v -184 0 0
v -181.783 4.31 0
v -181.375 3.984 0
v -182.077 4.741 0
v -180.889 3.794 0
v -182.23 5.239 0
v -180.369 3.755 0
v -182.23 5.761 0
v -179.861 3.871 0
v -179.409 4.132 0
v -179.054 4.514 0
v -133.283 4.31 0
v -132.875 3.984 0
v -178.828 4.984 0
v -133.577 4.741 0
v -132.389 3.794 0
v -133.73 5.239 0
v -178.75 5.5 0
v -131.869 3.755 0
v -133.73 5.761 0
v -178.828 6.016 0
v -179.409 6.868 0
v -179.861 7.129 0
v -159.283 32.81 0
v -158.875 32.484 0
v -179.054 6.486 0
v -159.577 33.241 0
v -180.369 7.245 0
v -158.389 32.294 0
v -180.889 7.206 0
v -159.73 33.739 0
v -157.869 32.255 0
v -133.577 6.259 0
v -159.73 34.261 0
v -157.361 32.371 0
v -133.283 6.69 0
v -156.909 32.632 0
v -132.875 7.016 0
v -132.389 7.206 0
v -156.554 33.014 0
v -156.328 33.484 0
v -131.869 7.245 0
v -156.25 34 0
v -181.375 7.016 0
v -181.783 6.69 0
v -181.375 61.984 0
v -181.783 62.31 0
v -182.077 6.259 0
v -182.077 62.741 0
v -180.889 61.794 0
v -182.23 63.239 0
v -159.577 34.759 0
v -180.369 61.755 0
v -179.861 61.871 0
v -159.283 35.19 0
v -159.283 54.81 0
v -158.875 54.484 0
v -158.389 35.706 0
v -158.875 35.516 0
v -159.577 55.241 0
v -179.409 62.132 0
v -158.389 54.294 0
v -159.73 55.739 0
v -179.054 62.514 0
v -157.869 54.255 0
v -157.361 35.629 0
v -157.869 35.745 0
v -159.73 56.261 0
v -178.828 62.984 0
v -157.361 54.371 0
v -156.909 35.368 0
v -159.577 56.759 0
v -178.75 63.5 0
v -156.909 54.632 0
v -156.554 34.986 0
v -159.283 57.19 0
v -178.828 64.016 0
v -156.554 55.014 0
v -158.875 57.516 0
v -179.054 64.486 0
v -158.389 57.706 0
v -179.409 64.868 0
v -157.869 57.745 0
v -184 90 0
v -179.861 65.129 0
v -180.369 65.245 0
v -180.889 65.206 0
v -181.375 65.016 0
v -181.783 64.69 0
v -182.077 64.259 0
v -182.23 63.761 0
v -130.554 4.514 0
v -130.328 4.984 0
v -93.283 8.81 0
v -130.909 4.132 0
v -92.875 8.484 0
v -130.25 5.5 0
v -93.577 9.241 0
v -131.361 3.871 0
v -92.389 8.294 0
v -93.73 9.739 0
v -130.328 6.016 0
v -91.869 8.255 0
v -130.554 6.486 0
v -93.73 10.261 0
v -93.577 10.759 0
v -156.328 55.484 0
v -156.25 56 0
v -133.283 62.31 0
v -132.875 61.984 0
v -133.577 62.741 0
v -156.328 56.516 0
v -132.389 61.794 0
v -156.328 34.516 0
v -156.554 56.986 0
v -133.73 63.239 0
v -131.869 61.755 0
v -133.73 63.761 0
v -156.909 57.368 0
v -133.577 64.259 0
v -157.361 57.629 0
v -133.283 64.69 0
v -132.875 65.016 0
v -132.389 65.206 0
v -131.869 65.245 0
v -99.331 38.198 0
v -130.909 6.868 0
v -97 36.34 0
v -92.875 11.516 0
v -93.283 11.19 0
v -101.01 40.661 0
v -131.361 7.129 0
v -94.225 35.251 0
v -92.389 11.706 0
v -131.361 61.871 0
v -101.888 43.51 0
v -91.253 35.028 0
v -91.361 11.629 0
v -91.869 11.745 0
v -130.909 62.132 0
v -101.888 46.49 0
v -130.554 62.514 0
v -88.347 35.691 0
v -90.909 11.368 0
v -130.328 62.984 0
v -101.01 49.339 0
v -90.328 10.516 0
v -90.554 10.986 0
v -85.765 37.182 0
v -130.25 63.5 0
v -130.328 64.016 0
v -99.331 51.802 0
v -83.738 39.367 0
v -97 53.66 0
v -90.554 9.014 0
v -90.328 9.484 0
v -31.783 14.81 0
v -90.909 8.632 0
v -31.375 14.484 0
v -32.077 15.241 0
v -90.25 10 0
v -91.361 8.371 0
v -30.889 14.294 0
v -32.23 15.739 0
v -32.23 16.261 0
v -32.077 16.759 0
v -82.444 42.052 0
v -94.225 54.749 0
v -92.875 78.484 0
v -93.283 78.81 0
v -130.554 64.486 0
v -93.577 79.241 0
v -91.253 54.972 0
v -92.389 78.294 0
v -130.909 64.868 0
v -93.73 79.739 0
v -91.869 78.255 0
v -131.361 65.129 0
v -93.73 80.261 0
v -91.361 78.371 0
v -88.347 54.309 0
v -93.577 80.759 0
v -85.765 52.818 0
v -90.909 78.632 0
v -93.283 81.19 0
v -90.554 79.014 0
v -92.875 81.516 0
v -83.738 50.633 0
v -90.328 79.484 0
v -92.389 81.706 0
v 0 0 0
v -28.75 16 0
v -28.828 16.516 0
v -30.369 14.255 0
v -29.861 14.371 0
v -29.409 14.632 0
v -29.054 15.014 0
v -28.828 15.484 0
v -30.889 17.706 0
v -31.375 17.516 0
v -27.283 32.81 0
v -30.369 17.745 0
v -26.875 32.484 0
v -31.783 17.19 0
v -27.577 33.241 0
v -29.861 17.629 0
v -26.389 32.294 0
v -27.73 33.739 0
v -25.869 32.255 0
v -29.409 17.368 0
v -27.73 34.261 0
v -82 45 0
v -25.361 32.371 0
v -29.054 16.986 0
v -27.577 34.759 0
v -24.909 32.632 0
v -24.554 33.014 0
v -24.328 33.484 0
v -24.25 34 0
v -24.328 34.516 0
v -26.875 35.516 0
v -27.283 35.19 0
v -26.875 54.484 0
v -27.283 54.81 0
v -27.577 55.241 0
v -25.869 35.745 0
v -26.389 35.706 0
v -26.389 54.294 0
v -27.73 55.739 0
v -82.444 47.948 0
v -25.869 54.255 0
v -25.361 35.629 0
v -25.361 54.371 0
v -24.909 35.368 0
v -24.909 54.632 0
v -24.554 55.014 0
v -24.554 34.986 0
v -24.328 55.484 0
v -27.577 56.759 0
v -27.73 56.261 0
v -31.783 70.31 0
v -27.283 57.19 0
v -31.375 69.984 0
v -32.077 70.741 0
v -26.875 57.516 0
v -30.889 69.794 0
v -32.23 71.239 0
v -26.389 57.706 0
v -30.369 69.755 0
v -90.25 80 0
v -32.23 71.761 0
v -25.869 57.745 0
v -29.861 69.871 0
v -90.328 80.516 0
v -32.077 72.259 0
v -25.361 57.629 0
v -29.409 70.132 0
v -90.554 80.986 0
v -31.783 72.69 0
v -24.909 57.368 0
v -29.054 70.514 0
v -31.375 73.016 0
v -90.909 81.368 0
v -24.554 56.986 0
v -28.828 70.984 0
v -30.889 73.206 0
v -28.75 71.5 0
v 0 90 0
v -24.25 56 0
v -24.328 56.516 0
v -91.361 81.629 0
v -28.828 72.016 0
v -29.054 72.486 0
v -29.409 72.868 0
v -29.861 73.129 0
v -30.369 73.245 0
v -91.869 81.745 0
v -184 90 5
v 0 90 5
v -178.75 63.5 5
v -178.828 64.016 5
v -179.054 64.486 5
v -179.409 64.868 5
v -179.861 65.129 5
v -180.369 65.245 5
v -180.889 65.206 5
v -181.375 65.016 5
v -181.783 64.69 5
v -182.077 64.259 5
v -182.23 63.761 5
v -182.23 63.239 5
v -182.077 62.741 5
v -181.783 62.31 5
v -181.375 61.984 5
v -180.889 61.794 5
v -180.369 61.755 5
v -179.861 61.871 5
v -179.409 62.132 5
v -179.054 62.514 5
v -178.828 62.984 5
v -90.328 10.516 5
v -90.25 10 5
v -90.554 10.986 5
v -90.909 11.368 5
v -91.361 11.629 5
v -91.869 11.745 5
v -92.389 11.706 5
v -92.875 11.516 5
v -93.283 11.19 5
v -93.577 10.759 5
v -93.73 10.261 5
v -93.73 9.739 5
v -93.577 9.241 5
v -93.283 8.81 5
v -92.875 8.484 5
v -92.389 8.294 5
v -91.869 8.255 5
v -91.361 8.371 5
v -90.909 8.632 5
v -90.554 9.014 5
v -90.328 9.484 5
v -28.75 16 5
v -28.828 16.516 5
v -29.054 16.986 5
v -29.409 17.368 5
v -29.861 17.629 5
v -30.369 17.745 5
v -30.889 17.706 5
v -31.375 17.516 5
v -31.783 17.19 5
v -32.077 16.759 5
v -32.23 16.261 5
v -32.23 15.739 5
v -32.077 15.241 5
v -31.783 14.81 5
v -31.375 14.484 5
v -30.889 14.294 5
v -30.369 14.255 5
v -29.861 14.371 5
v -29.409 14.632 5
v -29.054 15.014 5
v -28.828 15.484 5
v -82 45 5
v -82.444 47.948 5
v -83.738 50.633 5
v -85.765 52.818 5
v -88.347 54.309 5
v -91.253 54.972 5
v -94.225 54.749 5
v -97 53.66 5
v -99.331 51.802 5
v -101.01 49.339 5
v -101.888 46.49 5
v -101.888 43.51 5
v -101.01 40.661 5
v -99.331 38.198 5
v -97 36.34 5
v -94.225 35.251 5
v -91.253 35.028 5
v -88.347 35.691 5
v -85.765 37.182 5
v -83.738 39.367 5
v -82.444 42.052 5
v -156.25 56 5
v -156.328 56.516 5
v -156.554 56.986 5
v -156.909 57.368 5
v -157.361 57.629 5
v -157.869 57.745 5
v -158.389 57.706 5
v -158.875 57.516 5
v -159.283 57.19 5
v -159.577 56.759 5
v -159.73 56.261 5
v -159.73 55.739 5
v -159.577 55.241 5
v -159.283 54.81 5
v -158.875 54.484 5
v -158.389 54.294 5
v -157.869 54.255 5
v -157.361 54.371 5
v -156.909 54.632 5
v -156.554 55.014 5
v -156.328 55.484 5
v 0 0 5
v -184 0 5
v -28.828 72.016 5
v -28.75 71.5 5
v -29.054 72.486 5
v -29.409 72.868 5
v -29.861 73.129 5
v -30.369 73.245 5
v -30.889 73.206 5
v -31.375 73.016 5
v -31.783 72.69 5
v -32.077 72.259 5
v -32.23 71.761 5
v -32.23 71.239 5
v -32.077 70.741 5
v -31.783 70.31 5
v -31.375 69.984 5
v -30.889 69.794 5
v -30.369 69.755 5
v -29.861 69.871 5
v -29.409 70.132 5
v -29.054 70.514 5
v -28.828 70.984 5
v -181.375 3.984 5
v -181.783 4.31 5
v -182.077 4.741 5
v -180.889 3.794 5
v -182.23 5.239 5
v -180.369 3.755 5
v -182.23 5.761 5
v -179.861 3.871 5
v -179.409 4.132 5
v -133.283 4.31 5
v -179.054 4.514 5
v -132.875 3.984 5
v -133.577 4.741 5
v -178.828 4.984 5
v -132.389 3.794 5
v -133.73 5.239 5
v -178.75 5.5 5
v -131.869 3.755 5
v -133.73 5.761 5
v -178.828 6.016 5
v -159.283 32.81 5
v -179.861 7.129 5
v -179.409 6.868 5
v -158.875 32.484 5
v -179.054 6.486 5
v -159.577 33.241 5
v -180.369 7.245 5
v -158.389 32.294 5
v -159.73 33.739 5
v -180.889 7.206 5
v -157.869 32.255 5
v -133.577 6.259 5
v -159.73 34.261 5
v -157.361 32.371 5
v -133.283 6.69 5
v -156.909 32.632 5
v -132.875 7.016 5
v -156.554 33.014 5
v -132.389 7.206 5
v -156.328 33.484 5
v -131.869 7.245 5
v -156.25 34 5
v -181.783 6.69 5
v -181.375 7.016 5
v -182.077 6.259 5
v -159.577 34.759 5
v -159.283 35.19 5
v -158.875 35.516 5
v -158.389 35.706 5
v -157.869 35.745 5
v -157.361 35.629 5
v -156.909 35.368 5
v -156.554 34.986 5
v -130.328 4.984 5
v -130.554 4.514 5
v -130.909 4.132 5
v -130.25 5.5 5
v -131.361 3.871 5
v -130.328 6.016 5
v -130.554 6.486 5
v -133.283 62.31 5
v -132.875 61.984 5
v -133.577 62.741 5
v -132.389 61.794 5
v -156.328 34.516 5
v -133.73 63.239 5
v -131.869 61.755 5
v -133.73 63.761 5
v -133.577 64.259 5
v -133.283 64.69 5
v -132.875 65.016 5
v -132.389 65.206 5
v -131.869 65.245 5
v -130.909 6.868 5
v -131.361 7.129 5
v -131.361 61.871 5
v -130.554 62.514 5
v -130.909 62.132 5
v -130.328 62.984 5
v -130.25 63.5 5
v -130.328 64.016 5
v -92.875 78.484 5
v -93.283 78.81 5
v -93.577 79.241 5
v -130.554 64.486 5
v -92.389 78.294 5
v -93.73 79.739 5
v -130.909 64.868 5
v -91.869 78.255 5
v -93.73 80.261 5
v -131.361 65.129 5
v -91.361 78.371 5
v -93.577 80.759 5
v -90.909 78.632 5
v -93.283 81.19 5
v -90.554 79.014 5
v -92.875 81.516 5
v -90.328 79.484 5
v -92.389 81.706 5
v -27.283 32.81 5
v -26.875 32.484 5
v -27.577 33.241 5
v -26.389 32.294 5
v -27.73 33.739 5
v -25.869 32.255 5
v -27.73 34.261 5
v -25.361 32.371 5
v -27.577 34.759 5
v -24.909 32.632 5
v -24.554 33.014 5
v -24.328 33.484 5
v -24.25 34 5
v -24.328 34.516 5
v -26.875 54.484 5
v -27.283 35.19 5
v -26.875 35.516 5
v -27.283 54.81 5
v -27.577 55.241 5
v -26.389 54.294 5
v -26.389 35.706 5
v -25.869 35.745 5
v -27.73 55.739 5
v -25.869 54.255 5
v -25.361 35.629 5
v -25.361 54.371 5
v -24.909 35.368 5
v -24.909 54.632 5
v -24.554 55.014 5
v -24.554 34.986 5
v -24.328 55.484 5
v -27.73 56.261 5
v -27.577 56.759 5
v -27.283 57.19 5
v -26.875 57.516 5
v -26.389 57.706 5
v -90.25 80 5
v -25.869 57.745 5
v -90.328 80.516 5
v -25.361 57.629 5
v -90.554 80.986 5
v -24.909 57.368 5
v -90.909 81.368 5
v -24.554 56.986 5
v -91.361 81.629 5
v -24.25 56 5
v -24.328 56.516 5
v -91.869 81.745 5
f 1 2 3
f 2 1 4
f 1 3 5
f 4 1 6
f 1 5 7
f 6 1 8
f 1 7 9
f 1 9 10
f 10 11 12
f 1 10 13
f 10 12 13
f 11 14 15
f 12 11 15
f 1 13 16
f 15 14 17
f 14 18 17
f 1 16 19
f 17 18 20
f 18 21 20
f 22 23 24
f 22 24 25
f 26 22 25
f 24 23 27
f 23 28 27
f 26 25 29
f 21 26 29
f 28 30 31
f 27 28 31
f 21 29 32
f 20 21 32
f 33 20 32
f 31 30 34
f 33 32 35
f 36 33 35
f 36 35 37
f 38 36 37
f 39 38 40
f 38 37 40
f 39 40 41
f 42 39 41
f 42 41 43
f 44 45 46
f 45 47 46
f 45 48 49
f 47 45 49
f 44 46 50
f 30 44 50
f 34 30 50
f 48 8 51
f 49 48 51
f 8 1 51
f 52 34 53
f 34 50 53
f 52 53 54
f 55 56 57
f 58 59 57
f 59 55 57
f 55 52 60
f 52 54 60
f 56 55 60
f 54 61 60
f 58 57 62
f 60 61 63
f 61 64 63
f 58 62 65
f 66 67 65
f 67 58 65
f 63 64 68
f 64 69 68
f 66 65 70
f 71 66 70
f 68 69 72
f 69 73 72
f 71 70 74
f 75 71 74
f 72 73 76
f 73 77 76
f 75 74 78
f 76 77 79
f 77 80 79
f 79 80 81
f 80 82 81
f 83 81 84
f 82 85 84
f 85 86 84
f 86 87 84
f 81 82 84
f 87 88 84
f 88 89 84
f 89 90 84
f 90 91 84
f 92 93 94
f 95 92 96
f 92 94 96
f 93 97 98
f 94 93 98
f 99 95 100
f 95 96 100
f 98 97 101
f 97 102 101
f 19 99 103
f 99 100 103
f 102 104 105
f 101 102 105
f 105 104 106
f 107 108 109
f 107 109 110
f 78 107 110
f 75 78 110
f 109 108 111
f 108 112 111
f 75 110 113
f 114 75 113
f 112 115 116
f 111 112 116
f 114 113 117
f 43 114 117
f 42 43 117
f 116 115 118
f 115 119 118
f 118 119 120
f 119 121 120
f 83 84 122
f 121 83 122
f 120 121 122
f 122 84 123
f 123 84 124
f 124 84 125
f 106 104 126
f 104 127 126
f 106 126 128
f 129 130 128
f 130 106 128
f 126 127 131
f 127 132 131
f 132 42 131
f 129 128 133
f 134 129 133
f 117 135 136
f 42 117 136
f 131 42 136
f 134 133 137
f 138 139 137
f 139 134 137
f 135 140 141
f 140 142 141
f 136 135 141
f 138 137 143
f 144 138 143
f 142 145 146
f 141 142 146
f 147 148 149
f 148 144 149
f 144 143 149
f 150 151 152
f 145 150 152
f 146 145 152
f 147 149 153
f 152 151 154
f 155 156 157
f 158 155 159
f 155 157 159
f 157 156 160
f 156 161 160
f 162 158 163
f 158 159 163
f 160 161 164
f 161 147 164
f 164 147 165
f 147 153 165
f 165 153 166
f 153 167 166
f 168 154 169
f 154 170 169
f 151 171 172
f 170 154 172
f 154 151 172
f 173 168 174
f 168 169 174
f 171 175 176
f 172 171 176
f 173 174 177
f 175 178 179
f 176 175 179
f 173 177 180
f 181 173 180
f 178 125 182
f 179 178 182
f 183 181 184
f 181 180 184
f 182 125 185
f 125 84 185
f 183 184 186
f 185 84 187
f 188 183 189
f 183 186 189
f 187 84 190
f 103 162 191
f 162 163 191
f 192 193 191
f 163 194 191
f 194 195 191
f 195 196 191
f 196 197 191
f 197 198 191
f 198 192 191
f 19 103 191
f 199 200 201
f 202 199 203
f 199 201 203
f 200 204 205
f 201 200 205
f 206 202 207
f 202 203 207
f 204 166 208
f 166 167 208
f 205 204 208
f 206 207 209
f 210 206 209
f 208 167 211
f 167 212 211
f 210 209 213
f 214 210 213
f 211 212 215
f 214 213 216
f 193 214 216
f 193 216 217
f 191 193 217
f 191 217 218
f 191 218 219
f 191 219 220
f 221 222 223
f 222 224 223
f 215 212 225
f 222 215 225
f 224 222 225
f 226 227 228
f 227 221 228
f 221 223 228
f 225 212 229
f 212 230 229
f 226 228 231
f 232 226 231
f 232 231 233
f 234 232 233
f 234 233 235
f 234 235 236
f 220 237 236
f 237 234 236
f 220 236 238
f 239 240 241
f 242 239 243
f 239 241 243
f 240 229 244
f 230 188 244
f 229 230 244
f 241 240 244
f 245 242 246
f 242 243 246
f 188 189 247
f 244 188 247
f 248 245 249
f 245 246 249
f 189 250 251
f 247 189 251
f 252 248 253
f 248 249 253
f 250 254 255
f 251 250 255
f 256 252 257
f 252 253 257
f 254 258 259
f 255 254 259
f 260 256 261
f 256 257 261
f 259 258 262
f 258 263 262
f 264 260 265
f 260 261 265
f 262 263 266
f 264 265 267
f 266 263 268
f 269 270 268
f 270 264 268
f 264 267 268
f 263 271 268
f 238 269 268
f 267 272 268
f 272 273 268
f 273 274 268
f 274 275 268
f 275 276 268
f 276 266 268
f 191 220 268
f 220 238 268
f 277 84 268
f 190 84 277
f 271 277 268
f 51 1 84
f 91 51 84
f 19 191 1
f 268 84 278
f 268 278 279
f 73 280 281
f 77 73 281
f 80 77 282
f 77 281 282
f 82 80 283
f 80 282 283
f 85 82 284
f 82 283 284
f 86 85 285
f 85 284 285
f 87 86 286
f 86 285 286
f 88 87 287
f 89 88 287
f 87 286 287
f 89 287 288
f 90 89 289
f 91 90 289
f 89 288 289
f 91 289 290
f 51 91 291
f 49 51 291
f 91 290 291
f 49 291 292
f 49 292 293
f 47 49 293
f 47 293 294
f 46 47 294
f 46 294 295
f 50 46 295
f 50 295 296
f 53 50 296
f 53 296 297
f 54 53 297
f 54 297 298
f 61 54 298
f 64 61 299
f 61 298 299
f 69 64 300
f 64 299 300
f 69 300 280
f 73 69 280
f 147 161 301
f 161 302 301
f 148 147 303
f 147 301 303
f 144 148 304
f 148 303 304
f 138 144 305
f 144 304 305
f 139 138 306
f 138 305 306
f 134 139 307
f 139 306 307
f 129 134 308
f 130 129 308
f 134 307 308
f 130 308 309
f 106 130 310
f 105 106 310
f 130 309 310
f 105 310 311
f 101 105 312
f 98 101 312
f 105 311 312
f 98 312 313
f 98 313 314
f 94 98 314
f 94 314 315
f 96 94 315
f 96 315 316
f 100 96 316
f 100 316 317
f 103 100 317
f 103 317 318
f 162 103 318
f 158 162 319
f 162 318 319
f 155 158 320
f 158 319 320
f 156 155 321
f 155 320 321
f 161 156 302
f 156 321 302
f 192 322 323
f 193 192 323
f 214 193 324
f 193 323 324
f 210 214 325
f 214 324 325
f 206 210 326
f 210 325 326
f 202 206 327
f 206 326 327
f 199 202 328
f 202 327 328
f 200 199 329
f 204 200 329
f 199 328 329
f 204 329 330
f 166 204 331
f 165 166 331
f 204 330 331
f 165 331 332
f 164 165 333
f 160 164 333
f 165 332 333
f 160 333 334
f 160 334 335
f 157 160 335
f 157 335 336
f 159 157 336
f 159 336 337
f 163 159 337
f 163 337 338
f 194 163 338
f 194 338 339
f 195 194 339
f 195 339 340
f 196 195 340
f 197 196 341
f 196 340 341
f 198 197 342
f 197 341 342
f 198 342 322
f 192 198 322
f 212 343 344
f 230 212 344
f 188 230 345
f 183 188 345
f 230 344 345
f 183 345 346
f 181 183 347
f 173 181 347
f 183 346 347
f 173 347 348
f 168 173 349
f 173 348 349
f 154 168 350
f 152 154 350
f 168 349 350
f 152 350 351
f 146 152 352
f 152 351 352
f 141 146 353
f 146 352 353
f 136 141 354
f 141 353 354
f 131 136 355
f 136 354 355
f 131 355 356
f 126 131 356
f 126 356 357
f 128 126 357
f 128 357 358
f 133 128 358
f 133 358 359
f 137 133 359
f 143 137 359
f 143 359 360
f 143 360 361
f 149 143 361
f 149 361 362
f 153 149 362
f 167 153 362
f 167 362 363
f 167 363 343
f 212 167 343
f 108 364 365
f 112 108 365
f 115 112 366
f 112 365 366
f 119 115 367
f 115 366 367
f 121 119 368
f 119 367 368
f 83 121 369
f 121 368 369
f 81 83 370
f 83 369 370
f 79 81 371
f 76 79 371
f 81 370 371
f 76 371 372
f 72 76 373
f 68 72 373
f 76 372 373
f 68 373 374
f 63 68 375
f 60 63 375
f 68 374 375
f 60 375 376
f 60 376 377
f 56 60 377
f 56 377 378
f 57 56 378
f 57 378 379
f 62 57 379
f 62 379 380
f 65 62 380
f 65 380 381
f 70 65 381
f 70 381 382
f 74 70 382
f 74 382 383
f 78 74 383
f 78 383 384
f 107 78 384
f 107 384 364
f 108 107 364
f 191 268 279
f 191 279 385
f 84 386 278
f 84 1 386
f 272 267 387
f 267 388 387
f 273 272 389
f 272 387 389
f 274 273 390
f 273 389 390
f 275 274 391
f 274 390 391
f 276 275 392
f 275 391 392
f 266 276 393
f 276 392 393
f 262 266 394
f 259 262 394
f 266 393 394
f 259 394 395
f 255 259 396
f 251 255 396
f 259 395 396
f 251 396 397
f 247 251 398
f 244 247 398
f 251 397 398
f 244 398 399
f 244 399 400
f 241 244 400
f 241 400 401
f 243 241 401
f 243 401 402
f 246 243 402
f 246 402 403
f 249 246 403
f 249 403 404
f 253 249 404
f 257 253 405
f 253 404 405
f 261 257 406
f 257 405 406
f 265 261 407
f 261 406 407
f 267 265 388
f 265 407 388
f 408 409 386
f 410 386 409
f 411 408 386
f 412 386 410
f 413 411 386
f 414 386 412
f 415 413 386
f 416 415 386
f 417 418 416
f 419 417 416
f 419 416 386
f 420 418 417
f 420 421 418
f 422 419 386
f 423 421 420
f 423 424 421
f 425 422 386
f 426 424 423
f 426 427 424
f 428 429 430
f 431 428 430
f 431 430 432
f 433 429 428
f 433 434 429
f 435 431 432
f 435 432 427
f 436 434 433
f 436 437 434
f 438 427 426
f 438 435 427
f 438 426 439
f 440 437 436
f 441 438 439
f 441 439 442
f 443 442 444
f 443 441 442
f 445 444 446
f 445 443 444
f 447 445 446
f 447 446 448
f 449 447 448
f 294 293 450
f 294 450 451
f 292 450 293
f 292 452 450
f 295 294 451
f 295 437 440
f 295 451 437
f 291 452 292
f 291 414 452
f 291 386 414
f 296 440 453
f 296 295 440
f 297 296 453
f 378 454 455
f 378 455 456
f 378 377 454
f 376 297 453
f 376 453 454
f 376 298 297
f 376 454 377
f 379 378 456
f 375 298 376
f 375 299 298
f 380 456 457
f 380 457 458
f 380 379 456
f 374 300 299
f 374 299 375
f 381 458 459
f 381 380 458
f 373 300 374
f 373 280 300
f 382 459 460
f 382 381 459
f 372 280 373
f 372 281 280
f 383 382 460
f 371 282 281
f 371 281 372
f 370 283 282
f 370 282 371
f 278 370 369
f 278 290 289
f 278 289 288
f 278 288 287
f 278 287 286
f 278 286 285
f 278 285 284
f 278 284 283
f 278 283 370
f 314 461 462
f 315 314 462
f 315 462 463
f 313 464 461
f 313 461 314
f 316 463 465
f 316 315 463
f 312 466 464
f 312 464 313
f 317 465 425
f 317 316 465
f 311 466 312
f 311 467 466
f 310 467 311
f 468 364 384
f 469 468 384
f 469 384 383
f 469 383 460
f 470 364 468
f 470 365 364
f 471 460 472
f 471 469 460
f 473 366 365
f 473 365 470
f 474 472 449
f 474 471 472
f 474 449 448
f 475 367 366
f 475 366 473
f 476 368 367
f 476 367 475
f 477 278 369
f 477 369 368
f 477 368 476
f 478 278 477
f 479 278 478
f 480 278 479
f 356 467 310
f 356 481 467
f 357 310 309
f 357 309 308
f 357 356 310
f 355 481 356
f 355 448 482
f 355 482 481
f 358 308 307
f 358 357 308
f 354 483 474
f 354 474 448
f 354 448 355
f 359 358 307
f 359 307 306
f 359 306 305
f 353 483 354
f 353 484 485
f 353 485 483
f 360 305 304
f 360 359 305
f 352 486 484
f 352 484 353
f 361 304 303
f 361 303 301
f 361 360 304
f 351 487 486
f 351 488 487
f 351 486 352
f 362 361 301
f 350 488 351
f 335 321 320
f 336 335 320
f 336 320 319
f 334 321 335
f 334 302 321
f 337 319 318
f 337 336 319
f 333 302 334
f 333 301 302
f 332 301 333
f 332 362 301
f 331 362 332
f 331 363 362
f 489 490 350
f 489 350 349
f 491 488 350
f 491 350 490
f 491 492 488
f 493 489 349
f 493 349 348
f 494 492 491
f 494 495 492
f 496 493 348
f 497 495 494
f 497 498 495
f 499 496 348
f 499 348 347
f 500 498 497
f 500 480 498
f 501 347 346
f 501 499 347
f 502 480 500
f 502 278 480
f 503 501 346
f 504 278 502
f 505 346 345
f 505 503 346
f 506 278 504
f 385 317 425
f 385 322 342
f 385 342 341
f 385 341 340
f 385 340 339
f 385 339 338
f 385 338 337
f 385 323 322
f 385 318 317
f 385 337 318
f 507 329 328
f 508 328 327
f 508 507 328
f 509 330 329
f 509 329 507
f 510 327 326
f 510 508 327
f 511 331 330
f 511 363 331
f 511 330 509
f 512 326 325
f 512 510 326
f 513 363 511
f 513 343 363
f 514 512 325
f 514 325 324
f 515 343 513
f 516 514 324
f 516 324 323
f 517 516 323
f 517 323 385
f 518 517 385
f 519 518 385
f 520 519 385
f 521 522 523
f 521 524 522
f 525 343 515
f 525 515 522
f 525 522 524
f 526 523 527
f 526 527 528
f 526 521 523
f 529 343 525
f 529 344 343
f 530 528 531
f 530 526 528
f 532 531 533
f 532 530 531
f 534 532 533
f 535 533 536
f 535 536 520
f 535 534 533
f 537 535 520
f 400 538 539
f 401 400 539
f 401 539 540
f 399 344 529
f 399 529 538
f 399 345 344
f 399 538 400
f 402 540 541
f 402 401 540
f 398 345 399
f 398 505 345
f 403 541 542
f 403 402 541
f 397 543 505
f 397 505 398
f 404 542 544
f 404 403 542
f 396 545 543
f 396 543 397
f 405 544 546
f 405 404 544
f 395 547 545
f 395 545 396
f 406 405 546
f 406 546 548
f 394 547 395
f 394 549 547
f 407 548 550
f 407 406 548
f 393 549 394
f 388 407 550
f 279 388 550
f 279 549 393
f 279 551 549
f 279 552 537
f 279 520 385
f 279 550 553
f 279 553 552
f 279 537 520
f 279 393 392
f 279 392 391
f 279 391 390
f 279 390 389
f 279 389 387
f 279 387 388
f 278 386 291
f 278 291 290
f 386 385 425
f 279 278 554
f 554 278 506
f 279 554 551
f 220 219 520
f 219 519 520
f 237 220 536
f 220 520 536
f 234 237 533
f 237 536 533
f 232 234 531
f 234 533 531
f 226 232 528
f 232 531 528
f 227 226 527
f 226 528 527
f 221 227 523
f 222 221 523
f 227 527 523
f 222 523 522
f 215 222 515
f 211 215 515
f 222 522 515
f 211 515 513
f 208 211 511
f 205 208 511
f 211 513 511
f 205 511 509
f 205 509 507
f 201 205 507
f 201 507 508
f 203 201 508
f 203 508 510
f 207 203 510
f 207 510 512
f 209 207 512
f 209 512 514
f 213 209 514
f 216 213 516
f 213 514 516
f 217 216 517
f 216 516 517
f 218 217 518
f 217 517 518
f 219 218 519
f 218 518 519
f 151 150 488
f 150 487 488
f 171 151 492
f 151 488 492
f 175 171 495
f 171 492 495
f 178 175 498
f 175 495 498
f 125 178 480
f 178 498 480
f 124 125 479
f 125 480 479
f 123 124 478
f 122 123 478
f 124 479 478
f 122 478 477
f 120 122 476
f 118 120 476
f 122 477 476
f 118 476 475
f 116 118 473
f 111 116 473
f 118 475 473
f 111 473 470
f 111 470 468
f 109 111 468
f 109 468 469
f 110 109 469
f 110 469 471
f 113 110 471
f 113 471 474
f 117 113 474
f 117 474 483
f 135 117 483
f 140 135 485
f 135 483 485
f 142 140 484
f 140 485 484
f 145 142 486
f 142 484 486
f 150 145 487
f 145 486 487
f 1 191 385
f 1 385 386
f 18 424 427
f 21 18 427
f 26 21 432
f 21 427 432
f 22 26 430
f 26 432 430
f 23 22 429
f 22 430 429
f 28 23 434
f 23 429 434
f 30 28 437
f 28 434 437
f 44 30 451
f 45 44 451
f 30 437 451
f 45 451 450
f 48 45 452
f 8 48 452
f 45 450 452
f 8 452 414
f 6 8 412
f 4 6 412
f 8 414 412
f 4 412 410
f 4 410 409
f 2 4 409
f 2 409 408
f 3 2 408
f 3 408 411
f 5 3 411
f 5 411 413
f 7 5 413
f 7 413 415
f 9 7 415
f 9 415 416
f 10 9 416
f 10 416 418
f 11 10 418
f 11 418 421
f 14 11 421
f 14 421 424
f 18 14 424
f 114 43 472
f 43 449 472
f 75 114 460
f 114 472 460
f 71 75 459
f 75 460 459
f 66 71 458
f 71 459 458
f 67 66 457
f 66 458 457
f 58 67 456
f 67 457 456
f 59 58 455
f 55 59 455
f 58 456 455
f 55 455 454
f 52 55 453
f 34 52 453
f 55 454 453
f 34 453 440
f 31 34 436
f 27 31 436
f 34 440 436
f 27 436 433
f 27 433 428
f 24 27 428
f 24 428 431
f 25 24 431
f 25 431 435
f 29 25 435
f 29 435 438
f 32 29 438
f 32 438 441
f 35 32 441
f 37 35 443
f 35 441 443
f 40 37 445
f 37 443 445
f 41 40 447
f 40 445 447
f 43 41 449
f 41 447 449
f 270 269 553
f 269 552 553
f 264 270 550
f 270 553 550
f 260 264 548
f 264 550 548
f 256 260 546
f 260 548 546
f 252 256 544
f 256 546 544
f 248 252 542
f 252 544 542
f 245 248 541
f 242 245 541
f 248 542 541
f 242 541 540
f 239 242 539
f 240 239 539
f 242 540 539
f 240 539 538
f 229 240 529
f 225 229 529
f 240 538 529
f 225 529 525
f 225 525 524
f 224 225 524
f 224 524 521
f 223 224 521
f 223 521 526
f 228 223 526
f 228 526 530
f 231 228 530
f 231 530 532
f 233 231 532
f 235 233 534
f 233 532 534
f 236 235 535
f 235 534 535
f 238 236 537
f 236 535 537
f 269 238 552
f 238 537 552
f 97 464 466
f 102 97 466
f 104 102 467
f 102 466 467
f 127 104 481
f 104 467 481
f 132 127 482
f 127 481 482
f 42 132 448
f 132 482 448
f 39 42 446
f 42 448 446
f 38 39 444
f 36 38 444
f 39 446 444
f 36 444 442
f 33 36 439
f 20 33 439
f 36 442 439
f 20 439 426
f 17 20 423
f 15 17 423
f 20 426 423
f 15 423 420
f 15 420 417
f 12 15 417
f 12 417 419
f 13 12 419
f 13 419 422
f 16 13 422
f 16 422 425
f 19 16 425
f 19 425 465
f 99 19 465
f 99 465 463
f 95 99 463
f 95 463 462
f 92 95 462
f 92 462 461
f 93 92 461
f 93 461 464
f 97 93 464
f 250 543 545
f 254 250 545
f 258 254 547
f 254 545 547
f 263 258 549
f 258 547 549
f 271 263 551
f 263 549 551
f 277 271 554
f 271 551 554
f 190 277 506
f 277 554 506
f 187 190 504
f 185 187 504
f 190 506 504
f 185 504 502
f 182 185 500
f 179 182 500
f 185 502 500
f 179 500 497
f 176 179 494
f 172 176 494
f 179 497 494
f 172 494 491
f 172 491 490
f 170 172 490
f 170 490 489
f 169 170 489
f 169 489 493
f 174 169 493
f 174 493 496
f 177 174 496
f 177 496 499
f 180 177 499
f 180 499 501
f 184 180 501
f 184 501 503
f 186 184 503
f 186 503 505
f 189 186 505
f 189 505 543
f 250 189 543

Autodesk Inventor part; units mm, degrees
ref_plane "YZ Plane" through (0, 0, 0) normal (1, 0, 0) x (0, 1, 0)
ref_plane "XZ Plane" through (0, 0, 0) normal (0, 1, 0) x (-1, 0, 0)
ref_plane "XY Plane" through (0, 0, 0) normal (0, 0, 1) x (1, 0, 0)
sketch "Эскиз1" plane through (0, 0, 0) normal (0, 0, 1) x (1, 0, 0)
  line L0 (0, 0) -> (-184, 0)
  line L1 (-184, 0) -> (-184, 90)
  line L2 (-184, 90) -> (0, 90)
  line L3 (0, 90) -> (0, 0)
  dimension "d0" = 184
  dimension "d1" = 90
extrude "Выдавливание1" add sketch "Эскиз1" along normal blind 5
sketch "Эскиз2" plane through (0, 0, 5) normal (0, 0, 1) x (1, 0, 0)
  line L0 (0, 90) -> (-184, 90) projected
  line L1 (-26, 45) -> (-26, 56)
  line L2 (-26, 56) -> (-158, 56)
  line L3 (-158, 56) -> (-158, 34)
  line L4 (-158, 34) -> (-26, 34)
  line L5 (-26, 34) -> (-26, 56)
  circle A0 centre (-158, 56) radius 1.75
  circle A1 centre (-26, 56) radius 1.75
  circle A2 centre (-26, 34) radius 1.75
  circle A3 centre (-158, 34) radius 1.75
  point P0 (0, 0)
  dimension "d43" = 11
  dimension "d44" = 132
  dimension "d45" = 22
  dimension "d46" = 3.5
  dimension "d47" = 3.5
  dimension "d48" = 3.5
  dimension "d49" = 3.5
extrude "Выдавливание2" cut sketch "Эскиз2" against normal blind 5 contours A1 L2 L1 | L1 L2 A1 | A2 L4 L5 | L5 L4 A2 | A0 L3 L2 | L2 L3 A0 | A3 L3 L4 | L4 L3 A3
sketch "Эскиз8" plane through (0, 0, 5) normal (0, 0, 1) x (1, 0, 0)
  line L0 (-184, 0) -> (-184, 90) projected
  line L1 (-184, 0) -> (-92, 0)
  line L2 (0, 0) -> (-184, 0) projected
  line L3 (-92, 0) -> (-92, 10)
  line L4 (-92, 10) -> (-92, 80)
  circle A0 centre (-92, 80) radius 1.75
  circle A1 centre (-92, 10) radius 1.75
  dimension "d52" = 92
  dimension "d53" = 10
  dimension "d54" = 70
  dimension "d55" = 3.5
  dimension "d56" = 3.5
extrude "Выдавливание3" cut sketch "Эскиз8" against normal blind 5
sketch "Эскиз9" plane through (0, 0, 5) normal (0, 0, 1) x (1, 0, 0)
  line L0 (0, 90) -> (0, 85)
  line L1 (0, 90) -> (0, 0) projected
  line L2 (-60, 85) -> (-60, 5)
  line L3 (-60, 5) -> (0, 5)
  line L4 (0, 5) -> (0, 85)
  line L5 (-184, 90) -> (-184, 87.5)
  line L6 (-184, 0) -> (-184, 90) projected
  line L7 (-184, 0) -> (-184, 2.5)
  line L8 (-129, 87.5) -> (-129, 2.5)
  line L9 (-129, 2.5) -> (-184, 2.5)
  line L10 (-184, 2.5) -> (-184, 87.5)
  line L11 (-60, 77) -> (-129, 77)
  line L12 (-129, 87.5) -> (-129, 63.5)
  line L13 (-129, 63.5) -> (-132, 63.5)
  circle A0 centre (-132, 63.5) radius 1.75
  circle A1 centre (-180.5, 63.5) radius 1.75
  circle A2 centre (-132, 5.5) radius 1.75
  circle A3 centre (-180.5, 5.5) radius 1.75
  line L14 (-180.5, 63.5) -> (-180.5, 5.5)
  line L15 (-180.5, 5.5) -> (-132, 5.5)
  line L16 (-132, 5.5) -> (-132, 63.5)
  line L17 (-60, 5) -> (-30.5, 5)
  line L18 (-30.5, 5) -> (-30.5, 16)
  circle A4 centre (-30.5, 16) radius 1.75
  line L19 (-30.5, 16) -> (-30.5, 71.5)
  circle A5 centre (-30.5, 71.5) radius 1.75
  dimension "d61" = 5
  dimension "d62" = 60
  dimension "d63" = 80
  dimension "d64" = 2.5
  dimension "d65" = 2.5
  dimension "d66" = 55
  dimension "d67" = 85
  dimension "d69" = 69
  dimension "d70" = 24
  dimension "d71" = 3
  dimension "d72" = 3.5
  dimension "d75" = 3.5
  dimension "d76" = 3.5
  dimension "d77" = 3.5
  dimension "d78" = 58
  dimension "d79" = 48.5
  dimension "d80" = 29.5
  dimension "d81" = 11
  dimension "d82" = 3.5
  dimension "d83" = 55.5
  dimension "d84" = 3.5
extrude "Выдавливание4" cut sketch "Эскиз9" against normal blind 5
sketch "Эскиз10" plane through (0, 0, 5) normal (0, 0, 1) x (1, 0, 0)
  line L0 (0, 0) -> (-184, 0) projected
  circle A0 centre (-92, 45) radius 10
  dimension "d89" = 20
extrude "Выдавливание5" cut sketch "Эскиз10" against normal blind 5
